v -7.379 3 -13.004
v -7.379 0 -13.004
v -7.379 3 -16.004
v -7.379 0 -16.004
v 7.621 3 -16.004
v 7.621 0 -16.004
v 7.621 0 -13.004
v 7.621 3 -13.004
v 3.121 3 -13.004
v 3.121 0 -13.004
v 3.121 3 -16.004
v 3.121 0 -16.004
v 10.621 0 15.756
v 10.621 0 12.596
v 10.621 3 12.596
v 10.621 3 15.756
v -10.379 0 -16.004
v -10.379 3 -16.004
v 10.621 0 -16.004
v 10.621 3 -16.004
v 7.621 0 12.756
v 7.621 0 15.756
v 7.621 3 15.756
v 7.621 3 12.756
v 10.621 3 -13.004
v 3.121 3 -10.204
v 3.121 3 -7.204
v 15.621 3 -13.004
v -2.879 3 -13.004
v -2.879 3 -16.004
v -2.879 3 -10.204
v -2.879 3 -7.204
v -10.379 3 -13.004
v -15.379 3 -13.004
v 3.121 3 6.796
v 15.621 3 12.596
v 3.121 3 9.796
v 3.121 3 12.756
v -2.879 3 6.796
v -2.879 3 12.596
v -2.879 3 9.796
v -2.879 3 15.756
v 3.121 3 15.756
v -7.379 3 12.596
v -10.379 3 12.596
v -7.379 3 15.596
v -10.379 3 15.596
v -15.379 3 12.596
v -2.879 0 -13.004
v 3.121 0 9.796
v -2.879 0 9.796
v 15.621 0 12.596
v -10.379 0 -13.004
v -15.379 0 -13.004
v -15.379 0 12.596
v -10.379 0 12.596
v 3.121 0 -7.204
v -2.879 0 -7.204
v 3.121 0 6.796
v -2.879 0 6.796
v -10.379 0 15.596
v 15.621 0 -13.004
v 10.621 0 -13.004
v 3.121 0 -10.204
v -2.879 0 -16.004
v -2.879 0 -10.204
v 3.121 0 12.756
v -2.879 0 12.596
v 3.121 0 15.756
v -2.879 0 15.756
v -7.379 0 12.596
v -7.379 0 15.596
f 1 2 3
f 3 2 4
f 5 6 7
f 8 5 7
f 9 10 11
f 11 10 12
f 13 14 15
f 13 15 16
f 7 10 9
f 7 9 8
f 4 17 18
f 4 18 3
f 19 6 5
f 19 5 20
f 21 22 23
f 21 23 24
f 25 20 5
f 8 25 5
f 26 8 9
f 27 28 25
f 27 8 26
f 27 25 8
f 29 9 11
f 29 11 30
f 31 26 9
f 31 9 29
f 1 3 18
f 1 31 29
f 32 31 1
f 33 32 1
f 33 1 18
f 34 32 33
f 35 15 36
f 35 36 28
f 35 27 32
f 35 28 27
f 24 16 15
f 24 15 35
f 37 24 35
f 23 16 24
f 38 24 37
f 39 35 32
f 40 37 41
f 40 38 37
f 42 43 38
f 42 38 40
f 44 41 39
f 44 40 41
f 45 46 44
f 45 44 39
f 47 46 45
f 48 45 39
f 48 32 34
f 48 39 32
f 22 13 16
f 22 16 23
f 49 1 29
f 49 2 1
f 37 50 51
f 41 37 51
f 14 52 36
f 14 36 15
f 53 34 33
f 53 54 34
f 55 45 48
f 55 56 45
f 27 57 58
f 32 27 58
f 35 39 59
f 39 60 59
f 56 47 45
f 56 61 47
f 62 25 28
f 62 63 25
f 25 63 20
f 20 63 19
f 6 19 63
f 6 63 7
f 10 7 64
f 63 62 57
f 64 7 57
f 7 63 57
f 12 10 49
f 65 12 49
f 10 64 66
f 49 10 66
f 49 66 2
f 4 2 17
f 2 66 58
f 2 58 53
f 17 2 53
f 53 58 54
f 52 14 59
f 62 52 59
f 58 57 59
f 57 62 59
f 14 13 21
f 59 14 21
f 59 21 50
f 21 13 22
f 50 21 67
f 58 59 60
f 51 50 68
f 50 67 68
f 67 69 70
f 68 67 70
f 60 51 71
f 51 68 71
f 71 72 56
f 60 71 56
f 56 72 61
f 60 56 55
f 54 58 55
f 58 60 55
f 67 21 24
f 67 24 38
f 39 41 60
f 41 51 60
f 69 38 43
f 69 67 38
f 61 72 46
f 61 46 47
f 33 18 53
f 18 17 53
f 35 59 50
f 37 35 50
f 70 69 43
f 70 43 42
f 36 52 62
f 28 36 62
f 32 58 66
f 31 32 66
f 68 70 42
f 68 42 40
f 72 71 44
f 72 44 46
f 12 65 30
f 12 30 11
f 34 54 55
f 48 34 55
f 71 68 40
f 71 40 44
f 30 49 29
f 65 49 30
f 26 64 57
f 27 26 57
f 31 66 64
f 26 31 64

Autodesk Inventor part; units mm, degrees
ref_plane "YZ Plane" through (0, 0, 0) normal (1, 0, 0) x (0, 1, 0)
ref_plane "XZ Plane" through (0, 0, 0) normal (0, 1, 0) x (-1, 0, 0)
ref_plane "XY Plane" through (0, 0, 0) normal (0, 0, 1) x (1, 0, 0)
sketch "Sketch2" plane through (0, 0, 0) normal (0, 1, 0) x (-1, 0, 0)
  line L0 (2.8786, -13.004) -> (2.8786, -16.004)
  line L1 (-3.1214, -13.004) -> (-3.1214, -16.004)
  line L2 (10.3786, -16.004) -> (10.3786, -13.004) construction
  line L3 (7.3786, -13.004) -> (7.3786, -16.004)
  line L4 (-7.6214, -16.004) -> (-7.6214, -13.004)
  line L5 (-10.6214, -13.004) -> (-10.6214, -16.004)
  line L6 (15.3786, -13.004) -> (15.3786, 12.596)
  line L7 (10.3786, 15.596) -> (10.3786, 12.5963)
  line L8 (7.3786, 12.596) -> (7.3786, 15.596)
  line L9 (2.8786, 15.7558) -> (2.8786, 12.596)
  line L10 (-3.1214, 12.7558) -> (-3.1214, 15.7558)
  line L11 (-7.6214, 15.7558) -> (-7.6214, 12.7558)
  line L12 (-10.6214, 12.596) -> (-10.6214, 15.7558)
  line L13 (10.3786, -16.004) -> (10.3786, -13.004)
  line L14 (15.3786, -13.004) -> (10.3786, -13.004)
  line L15 (10.3786, -16.004) -> (7.3786, -16.004)
  line L16 (7.3786, -13.004) -> (2.8786, -13.004)
  line L17 (2.8786, -16.004) -> (-3.1214, -16.004)
  line L18 (-3.1214, -13.004) -> (-7.6214, -13.004)
  line L19 (-7.6214, -16.004) -> (-10.6214, -16.004)
  line L20 (-10.6214, -13.004) -> (-15.6214, -13.004)
  line L21 (-15.6214, 12.596) -> (-10.6214, 12.596)
  line L22 (-10.6214, 15.7558) -> (-7.6214, 15.7558)
  line L23 (-7.6214, 12.7558) -> (-3.1214, 12.7558)
  line L24 (-3.1214, 15.7558) -> (2.8786, 15.7558)
  line L25 (2.8786, 12.596) -> (7.3786, 12.596)
  line L26 (7.3786, 15.596) -> (10.3786, 15.596)
  line L27 (10.3786, 12.5963) -> (15.3786, 12.596)
  line L28 (-15.6214, 12.596) -> (-15.6214, -13.004)
  line L29 (15.3786, -0.204) -> (-15.6214, -0.204) construction
  line L30 (7.3786, -13.004) -> (7.3786, -0.204) construction
  line L31 (7.3786, -0.204) -> (7.3786, 12.596) construction
  line L32 (2.8786, -10.204) -> (-3.1214, -10.204)
  line L33 (-3.1214, -10.204) -> (-3.1214, -7.204)
  line L34 (-3.1214, -7.204) -> (2.8786, -7.204)
  line L35 (2.8786, -7.204) -> (2.8786, -10.204)
  line L36 (2.8786, 6.796) -> (-3.1214, 6.796)
  line L37 (-3.1214, 6.796) -> (-3.1214, 9.796)
  line L38 (-3.1214, 9.796) -> (2.8786, 9.796)
  line L39 (2.8786, 9.796) -> (2.8786, 6.796)
  dimension "d14" = 3
  dimension "d15" = 3
  dimension "d16" = 6
  dimension "d17" = 31
  dimension "d18" = 4.5
  dimension "d19" = 25.6
  dimension "d39" = 6
  dimension "d40" = 3
  dimension "d41" = 7
  dimension "d42" = 6
  dimension "d43" = 3
  dimension "d44" = 7
extrude "Extrusion1" add sketch "Sketch2" along normal blind 3 contours L0 L17 L1 L18 L4 L19 L5 L20 L28 L21 L12 L22 L11 L23 L10 L24 L9 L25 L8 L26 L7 L27 L6 L14 L13 L15 L3 L16 | L32 L33 L34 L35 | L36 L37 L38 L39
extrude "Extrusion2" cut sketch "Sketch2" along normal up to next contours L36 L37 L38 L39
extrude "Extrusion3" cut sketch "Sketch2" along normal up to next contours L32 L33 L34 L35
properties part number "part_plunger_handle_side2"
